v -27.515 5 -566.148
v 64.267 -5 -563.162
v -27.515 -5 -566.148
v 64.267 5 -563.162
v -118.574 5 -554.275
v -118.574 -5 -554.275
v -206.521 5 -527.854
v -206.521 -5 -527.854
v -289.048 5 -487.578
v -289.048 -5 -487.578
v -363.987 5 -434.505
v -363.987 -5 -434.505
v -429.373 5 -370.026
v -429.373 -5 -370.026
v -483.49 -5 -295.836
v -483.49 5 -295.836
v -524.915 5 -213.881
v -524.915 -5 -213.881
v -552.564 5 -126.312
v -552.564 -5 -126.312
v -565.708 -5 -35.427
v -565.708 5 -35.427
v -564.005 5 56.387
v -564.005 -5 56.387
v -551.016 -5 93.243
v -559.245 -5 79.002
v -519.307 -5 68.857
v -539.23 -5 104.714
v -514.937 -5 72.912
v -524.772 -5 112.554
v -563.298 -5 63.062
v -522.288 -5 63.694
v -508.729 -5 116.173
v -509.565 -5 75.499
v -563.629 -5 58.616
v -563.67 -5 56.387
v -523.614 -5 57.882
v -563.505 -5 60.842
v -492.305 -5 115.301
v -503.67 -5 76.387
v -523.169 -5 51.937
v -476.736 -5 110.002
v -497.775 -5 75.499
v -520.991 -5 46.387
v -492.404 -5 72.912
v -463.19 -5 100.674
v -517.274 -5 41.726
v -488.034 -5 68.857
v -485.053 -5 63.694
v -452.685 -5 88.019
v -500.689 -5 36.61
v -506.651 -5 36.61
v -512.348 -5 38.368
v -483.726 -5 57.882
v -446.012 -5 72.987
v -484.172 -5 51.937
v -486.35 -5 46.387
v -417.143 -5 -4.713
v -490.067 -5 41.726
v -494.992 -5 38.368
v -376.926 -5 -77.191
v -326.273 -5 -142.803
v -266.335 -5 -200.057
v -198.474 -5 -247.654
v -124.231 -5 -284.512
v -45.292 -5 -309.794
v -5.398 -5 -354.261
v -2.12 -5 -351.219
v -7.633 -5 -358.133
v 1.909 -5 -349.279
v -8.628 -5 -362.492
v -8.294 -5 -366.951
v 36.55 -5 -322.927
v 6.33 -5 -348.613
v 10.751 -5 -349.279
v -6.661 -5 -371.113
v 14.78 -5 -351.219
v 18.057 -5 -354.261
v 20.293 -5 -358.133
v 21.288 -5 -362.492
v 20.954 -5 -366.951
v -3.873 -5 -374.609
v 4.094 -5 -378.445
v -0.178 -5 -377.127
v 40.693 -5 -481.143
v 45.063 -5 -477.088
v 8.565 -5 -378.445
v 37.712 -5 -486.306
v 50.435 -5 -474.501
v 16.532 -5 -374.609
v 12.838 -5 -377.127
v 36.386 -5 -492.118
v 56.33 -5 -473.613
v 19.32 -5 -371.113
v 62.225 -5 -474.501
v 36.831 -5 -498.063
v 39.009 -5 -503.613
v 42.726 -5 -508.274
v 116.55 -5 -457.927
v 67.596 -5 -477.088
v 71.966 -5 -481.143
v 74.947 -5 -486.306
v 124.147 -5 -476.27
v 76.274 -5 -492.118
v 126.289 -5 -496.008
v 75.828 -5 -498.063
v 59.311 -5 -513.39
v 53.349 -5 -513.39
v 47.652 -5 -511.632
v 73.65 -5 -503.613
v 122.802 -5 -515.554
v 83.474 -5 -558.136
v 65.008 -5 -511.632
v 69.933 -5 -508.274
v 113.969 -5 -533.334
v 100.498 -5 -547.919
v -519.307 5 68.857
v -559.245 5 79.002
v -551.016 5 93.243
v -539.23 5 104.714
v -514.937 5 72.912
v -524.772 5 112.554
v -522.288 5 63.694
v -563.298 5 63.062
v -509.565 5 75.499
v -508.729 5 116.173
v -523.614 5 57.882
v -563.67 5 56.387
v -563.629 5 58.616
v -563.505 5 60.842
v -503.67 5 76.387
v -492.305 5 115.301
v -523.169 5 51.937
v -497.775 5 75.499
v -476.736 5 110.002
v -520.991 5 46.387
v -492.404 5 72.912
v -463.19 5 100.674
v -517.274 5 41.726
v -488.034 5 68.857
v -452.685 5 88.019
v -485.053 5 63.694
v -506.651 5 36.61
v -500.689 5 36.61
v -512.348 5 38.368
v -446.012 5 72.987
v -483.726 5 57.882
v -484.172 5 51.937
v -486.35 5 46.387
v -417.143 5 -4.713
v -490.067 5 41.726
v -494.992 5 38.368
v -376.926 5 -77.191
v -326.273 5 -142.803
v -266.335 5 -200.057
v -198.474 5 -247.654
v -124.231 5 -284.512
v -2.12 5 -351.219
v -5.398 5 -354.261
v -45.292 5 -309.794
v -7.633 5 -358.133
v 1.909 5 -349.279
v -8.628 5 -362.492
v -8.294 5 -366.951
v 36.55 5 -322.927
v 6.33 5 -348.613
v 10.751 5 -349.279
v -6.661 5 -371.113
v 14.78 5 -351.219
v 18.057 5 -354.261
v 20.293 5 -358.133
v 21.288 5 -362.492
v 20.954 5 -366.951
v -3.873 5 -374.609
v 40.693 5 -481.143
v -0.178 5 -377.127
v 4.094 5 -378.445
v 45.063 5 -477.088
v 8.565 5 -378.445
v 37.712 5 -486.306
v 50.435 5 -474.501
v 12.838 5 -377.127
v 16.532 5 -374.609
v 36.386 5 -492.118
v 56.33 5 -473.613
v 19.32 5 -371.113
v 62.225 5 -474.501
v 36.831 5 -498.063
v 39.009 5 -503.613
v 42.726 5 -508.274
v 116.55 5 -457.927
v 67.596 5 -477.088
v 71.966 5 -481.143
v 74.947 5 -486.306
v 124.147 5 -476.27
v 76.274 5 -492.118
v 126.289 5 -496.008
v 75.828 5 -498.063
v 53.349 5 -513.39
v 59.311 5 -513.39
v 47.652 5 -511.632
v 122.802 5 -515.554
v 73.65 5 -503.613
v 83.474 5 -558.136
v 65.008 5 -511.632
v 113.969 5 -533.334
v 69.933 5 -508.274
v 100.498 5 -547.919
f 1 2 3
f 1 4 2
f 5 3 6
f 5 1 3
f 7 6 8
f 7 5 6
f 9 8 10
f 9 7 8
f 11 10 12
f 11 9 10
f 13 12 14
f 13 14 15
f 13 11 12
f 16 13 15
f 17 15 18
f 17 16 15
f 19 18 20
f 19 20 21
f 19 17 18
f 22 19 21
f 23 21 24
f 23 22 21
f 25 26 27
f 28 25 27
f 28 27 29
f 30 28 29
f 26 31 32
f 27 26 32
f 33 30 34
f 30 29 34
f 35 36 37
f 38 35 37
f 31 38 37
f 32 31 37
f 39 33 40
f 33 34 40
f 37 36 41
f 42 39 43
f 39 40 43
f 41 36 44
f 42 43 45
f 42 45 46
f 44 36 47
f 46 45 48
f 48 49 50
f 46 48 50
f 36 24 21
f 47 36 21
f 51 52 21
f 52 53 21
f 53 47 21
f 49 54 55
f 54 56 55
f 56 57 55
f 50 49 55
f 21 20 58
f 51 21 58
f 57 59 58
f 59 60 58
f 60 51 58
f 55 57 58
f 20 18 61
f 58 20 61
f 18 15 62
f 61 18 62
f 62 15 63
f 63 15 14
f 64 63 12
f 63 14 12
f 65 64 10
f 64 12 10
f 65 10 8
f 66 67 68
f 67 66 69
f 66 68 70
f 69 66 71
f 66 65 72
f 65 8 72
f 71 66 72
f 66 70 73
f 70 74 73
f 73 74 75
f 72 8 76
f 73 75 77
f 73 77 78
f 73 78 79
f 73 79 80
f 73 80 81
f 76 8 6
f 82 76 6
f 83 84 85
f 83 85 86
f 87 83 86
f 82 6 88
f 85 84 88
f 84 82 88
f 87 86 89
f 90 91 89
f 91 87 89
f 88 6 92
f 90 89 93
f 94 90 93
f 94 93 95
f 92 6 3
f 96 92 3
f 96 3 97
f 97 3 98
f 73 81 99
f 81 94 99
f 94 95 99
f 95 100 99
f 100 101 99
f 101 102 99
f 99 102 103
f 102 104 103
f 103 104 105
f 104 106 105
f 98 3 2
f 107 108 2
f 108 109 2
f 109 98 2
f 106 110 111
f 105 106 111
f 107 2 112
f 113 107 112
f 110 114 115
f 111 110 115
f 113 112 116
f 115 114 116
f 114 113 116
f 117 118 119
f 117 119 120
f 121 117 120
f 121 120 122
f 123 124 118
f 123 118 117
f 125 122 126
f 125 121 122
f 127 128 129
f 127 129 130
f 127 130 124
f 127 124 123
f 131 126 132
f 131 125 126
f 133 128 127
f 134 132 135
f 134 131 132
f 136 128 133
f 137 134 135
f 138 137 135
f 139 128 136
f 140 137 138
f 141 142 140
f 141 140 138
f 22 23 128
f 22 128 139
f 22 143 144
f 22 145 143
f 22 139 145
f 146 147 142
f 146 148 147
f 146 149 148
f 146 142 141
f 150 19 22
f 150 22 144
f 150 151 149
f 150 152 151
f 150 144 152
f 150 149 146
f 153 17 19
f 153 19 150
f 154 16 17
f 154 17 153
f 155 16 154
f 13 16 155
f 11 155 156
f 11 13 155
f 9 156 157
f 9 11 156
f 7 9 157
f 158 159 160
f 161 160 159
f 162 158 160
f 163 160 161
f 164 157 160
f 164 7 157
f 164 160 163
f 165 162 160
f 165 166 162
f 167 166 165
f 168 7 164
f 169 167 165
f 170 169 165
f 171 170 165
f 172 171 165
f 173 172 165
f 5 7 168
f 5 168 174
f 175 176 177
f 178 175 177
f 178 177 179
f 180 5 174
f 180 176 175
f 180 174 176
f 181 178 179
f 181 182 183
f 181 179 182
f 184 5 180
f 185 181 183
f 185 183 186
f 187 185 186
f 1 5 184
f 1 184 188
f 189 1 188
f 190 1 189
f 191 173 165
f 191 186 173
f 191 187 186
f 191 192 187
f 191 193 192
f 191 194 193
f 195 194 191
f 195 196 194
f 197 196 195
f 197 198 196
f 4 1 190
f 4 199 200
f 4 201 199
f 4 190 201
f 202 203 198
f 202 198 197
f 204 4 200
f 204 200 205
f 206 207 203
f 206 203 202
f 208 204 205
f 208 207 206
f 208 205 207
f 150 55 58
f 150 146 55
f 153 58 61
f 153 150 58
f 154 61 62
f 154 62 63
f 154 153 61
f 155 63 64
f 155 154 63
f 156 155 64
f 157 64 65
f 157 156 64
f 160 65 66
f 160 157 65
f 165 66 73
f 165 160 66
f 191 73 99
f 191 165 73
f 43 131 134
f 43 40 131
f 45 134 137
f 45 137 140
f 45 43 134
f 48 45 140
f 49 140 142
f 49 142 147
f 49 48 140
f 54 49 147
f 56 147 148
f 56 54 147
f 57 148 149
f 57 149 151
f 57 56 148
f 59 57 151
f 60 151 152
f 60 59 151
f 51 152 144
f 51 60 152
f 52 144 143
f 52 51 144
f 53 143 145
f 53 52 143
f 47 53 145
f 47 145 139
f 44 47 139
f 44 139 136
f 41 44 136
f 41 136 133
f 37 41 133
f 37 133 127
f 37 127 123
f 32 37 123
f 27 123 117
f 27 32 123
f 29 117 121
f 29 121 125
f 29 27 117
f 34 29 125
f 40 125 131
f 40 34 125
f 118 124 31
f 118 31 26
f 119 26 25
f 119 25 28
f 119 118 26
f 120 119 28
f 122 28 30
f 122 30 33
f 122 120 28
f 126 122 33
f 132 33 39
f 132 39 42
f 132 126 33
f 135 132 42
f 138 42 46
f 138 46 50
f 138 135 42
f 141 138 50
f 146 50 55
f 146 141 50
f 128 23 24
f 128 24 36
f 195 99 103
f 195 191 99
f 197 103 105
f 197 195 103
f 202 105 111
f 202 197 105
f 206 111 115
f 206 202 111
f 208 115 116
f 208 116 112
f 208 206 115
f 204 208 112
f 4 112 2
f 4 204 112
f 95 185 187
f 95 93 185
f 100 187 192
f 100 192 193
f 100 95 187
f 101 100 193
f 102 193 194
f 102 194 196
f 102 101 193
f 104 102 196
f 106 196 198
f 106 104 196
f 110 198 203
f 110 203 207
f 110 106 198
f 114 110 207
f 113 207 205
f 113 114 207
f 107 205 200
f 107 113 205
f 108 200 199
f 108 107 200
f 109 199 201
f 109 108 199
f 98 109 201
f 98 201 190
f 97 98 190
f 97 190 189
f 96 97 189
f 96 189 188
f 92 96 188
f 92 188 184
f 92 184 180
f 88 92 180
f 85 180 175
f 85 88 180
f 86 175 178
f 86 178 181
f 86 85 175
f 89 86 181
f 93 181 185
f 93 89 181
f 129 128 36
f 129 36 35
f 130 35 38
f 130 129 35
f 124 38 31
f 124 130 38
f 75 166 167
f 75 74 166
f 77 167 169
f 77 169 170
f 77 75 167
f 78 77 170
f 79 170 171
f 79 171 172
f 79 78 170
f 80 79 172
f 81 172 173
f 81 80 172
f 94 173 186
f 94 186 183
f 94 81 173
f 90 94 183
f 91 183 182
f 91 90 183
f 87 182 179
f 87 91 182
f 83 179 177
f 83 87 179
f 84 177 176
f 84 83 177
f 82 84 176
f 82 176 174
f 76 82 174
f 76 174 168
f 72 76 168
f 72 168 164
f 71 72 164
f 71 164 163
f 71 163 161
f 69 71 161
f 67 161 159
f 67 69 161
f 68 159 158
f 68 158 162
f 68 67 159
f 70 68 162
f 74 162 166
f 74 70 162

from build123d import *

# Parameters (mm, degrees)
SKETCH1_R           = 20
SKETCH1_R_2         = 15
BOSS_EXTRUDE1_DEPTH = 5


with BuildPart() as part:
    # Sketch1 → Boss-Extrude1 (new, symmetric)
    with BuildSketch(Plane(origin=(0, 0, 0), x_dir=(1, 0, 0), z_dir=(0, 1, 0))):
        with BuildLine():
            ThreePointArc((64.266544208, 563.161560744), (-397.988377373, 403.591852842), (-564.00499401, -56.38704581))
            Line((-564.00499401, -56.38704581), (-563.670163319, -56.38704581))
            ThreePointArc((-563.670163319, -56.38704581), (-563.576965484, -59.729956873), (-563.297661506, -63.062482866))
            ThreePointArc((-563.297661506, -63.062482866), (-508.728959827, -116.173403601), (-446.012064302, -72.986552362))
            ThreePointArc((-446.012064302, -72.986552362), (-266.335078189, 200.056876387), (36.550244036, 322.926786868))
            Line((36.550244036, 322.926786868), (116.550244036, 457.926786868))
            ThreePointArc((116.550244036, 457.926786868), (119.01905015, 524.75878079), (64.266544208, 563.161560744))
        make_face()
        with Locations(Location((-503.670163319, -56.38704581, 0), (0, 0, 270))):
            Circle(SKETCH1_R, mode=Mode.SUBTRACT)
        with Locations(Location((6.329836681, 363.61295419, 0), (0, 0, 270))):
            Circle(SKETCH1_R_2, mode=Mode.SUBTRACT)
        with Locations(Location((56.329836681, 493.61295419, 0), (0, 0, 270))):
            Circle(SKETCH1_R, mode=Mode.SUBTRACT)
    extrude(amount=BOSS_EXTRUDE1_DEPTH, both=True)


solid = part.part
